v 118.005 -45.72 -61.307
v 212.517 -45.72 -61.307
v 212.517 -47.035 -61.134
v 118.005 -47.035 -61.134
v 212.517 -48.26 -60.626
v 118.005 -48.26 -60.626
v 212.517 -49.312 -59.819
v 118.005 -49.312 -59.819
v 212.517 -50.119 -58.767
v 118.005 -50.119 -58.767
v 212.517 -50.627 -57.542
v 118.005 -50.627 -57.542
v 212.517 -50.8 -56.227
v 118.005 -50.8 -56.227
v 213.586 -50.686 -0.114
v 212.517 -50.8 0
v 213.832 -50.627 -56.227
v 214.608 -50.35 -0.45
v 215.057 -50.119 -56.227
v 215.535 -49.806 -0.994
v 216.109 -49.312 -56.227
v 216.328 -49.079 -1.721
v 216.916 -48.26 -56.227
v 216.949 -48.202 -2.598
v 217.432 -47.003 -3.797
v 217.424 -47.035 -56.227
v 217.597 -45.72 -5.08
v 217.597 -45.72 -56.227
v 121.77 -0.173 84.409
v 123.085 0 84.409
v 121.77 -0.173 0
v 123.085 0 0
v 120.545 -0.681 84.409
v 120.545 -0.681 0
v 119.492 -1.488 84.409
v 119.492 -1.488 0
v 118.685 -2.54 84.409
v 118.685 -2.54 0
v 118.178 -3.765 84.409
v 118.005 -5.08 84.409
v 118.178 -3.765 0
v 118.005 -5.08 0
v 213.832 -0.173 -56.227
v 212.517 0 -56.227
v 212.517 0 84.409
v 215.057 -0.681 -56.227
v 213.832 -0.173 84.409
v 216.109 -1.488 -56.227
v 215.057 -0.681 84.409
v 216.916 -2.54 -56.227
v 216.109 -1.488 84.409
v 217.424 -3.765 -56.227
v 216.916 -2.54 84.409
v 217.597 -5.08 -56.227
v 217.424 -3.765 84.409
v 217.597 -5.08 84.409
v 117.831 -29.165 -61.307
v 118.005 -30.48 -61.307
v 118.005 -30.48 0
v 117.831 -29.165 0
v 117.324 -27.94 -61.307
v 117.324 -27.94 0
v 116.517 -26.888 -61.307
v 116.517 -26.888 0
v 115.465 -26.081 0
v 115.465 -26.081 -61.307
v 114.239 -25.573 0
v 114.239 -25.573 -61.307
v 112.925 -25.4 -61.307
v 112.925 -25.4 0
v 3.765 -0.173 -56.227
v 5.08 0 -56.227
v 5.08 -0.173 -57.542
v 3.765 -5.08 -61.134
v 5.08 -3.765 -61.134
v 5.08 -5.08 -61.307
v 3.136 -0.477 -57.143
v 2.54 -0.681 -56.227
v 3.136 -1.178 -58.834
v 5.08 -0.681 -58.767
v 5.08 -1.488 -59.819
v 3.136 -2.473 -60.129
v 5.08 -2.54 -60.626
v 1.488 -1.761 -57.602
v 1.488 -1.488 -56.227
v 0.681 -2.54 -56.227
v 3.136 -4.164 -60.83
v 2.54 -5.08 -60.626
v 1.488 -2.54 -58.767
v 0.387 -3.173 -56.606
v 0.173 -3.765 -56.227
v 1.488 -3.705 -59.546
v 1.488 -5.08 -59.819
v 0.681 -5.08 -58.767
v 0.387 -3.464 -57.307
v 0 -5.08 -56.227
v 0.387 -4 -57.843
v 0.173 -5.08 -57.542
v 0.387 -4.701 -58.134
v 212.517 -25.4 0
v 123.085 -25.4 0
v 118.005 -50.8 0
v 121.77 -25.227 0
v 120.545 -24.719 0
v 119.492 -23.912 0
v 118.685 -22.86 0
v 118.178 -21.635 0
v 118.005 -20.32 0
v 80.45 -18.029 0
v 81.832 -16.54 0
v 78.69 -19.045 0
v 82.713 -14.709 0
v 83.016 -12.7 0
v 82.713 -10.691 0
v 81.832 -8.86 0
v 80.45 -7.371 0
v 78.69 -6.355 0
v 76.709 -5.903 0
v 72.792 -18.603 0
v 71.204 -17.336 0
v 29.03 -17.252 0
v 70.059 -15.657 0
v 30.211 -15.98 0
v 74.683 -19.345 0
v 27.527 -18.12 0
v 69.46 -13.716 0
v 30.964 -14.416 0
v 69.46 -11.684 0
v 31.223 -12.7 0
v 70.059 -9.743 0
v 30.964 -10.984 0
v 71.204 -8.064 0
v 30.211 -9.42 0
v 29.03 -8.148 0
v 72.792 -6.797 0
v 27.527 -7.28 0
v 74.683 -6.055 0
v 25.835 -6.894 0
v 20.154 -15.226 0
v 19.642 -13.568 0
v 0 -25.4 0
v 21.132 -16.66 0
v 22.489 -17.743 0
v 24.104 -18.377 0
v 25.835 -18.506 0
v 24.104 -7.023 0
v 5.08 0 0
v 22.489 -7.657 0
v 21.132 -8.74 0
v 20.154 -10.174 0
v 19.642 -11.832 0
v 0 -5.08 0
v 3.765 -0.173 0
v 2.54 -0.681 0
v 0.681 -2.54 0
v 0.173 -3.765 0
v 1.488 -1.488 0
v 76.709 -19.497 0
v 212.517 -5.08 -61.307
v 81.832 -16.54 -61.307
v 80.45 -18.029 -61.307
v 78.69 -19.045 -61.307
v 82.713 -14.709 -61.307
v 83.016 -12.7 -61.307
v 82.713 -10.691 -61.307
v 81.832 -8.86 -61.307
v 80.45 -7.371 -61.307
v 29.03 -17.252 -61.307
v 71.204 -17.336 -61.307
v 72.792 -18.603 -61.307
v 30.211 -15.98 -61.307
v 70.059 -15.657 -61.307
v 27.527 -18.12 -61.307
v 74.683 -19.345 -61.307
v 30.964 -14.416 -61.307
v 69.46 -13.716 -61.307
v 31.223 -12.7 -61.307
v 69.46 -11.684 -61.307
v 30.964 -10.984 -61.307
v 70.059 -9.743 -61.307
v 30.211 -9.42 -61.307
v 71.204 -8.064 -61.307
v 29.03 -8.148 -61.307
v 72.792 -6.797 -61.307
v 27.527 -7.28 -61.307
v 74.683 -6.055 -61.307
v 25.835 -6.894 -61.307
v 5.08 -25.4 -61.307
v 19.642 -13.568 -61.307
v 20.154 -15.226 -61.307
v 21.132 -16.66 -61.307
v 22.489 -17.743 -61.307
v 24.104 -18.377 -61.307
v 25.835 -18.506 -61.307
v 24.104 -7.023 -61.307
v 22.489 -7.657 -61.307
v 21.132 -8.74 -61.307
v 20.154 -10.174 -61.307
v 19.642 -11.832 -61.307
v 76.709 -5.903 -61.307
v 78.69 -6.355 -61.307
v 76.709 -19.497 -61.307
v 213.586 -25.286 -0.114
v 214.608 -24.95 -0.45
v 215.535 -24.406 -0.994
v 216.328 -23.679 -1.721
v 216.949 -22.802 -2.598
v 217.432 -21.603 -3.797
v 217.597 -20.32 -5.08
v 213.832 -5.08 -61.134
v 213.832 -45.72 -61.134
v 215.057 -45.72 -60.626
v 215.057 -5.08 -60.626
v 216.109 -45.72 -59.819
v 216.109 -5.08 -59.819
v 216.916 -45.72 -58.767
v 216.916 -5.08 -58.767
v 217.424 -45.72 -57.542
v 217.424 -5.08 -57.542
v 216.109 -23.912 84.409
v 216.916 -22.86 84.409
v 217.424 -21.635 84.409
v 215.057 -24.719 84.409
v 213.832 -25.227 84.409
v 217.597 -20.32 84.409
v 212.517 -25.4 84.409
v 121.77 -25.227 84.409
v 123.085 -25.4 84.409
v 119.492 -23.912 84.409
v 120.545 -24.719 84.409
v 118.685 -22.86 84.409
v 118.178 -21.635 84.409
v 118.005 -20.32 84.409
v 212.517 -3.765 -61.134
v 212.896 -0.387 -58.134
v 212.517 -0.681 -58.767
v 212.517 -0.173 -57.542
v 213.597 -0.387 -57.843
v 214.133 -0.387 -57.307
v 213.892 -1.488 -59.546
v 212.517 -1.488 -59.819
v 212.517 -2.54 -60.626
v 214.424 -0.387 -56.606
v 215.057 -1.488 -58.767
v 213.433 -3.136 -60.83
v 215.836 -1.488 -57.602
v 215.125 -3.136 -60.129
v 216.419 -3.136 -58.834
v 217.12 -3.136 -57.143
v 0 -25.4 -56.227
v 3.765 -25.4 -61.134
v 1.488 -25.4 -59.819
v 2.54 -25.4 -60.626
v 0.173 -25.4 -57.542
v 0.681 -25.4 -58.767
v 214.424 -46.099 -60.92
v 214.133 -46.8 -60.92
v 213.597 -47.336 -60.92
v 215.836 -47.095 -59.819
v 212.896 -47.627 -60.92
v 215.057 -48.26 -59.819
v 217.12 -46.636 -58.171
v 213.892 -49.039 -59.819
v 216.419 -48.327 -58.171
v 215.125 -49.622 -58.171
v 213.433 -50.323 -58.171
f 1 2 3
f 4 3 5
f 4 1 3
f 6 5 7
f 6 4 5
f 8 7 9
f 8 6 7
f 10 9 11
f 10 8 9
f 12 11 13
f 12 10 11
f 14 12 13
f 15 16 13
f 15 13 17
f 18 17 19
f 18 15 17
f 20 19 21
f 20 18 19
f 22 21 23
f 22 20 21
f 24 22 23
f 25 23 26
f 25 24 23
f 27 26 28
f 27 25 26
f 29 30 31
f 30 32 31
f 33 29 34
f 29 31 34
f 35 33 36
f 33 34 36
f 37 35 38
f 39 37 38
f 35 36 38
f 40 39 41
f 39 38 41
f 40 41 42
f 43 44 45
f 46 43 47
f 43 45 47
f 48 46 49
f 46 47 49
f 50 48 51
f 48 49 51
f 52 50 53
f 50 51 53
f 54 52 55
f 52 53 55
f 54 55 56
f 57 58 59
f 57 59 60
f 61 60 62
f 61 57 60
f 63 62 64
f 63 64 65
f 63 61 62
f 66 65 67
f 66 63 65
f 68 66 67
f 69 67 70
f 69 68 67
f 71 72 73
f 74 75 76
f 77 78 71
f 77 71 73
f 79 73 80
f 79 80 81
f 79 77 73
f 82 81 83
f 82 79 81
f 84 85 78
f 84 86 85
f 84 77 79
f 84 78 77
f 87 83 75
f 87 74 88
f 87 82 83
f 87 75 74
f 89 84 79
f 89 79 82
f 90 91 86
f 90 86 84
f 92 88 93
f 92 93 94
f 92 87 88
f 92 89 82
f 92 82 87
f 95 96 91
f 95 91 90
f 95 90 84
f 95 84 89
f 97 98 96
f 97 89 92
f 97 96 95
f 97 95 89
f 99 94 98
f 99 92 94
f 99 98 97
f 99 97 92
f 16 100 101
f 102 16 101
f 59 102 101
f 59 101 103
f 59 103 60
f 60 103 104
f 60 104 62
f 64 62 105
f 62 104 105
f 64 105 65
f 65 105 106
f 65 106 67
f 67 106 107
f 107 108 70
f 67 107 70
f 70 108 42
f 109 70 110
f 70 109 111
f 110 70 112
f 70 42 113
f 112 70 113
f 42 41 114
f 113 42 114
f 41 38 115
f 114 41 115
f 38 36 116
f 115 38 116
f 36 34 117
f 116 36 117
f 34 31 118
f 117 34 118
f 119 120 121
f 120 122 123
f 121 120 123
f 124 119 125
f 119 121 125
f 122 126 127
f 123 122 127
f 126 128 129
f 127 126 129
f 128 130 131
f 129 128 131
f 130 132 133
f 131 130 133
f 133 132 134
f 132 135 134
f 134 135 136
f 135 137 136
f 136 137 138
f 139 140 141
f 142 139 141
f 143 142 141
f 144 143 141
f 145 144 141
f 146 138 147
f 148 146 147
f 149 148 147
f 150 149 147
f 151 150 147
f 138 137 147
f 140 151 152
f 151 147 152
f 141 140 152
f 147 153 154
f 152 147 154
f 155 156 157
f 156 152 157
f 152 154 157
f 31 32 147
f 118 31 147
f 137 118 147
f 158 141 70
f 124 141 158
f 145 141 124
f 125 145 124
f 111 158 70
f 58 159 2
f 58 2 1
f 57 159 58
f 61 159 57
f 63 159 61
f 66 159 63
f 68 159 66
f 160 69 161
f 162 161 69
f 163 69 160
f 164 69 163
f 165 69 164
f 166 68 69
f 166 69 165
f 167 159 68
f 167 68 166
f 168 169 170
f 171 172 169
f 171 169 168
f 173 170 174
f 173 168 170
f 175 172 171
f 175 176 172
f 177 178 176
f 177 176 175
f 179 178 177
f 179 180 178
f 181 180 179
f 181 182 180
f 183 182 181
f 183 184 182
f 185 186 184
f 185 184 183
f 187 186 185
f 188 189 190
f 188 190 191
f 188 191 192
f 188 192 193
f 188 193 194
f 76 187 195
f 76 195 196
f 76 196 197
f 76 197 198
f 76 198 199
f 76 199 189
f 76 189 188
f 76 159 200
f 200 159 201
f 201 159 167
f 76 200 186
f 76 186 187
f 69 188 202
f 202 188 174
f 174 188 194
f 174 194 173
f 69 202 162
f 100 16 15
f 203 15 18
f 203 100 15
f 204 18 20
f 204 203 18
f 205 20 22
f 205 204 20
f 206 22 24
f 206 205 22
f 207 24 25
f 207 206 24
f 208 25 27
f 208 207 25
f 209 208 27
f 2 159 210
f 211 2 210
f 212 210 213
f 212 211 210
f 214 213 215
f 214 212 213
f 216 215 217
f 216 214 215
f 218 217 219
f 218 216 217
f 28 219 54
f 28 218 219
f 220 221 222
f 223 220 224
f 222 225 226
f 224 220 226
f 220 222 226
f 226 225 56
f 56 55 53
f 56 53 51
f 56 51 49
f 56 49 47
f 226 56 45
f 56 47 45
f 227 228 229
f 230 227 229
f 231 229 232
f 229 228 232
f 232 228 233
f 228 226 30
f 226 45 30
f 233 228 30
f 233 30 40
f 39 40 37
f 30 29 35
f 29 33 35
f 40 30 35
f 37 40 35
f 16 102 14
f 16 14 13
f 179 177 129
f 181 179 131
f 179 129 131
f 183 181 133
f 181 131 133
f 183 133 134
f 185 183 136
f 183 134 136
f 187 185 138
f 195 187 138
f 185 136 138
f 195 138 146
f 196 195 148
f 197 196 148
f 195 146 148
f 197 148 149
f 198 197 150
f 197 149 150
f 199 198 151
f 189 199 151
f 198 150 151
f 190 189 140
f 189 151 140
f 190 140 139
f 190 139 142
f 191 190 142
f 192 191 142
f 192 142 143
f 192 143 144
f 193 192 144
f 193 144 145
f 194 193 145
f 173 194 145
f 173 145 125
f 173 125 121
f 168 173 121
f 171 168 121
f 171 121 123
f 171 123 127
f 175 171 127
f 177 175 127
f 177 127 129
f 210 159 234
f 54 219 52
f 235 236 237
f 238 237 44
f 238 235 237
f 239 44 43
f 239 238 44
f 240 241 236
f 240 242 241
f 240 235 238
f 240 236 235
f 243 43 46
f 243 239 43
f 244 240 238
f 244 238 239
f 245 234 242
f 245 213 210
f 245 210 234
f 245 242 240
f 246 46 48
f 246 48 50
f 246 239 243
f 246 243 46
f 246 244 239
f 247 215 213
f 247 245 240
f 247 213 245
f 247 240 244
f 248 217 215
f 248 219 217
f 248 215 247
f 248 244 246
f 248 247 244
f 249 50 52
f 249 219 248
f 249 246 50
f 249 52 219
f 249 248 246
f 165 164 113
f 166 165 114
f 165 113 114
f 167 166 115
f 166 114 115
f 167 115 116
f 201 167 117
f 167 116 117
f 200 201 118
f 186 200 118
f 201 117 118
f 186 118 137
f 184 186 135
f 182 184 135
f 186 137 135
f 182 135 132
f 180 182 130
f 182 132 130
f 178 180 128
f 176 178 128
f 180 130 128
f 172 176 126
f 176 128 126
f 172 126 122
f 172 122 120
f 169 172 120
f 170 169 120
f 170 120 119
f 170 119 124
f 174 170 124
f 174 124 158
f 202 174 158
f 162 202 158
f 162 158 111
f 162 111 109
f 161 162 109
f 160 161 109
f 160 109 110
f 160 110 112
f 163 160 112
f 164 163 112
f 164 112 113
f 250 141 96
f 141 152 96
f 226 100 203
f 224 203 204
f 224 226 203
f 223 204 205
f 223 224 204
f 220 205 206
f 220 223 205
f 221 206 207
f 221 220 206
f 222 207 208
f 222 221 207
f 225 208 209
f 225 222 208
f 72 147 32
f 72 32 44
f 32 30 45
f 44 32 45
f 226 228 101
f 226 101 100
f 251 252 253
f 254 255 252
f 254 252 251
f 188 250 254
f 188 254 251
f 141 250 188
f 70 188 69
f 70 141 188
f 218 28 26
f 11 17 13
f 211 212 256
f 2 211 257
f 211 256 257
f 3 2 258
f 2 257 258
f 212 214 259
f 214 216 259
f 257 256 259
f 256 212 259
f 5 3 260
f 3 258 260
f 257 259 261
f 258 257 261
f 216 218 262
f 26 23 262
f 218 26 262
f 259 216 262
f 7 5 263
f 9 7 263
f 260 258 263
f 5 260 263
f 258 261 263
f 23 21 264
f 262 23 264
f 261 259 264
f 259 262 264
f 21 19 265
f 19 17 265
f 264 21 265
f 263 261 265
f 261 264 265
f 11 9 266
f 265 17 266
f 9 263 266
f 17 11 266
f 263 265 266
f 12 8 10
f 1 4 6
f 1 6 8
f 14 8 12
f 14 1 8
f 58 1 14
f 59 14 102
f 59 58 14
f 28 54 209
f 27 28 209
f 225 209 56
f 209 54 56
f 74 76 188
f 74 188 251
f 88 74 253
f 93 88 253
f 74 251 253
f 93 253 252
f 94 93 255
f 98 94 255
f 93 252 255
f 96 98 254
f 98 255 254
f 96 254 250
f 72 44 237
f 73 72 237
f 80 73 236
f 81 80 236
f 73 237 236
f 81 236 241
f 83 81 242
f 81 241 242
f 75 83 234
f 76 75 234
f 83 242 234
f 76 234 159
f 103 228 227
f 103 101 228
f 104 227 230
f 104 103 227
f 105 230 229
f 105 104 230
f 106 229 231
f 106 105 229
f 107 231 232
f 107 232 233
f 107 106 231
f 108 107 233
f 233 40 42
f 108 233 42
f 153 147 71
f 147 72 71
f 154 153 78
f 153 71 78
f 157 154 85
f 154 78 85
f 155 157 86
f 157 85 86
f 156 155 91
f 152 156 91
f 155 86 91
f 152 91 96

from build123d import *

# Parameters (mm, degrees)
F1_DEPTH    = 25.4
F2_R        = 5.8227150046
F2_R_2      = 6.8159523424
F3_DEPTH    = 152.4
F4_W        = 99.5925068855
F4_H        = 61.3070130348
F5_DEPTH    = 25.4
F6_T1_DEPTH = 61.3070130348
F7_R        = 5.08
F8_R        = 5.08
F9_R        = 5.08
F10_R       = 5.08
F11_R       = 5.08
F12_R       = 5.08
F13_R       = 5.08


# Not quite as in the source:
# - a fillet or chamfer that OpenCascade refuses, or shapes differently, is made with other operations: its cross-section is extruded or revolved along the edge and cut away or added


with BuildPart() as f1:
    # F0 (on Front) → F1 (new body)
    with BuildSketch(Plane.XZ):
        Polygon((118.0045455694, 0), (0, 0), (0, -61.3070130348), (217.5970524549, -61.3070130348), (217.5970524549, 84.4091549516), (118.0045455694, 84.4091549516), align=None)
    extrude(amount=F1_DEPTH)

    # F2 (on face) → F3 (cut)
    with BuildSketch(Plane.XY):
        with Locations((25.4, -12.7)):
            Circle(F2_R)
        with Locations((76.2, -12.7)):
            Circle(F2_R_2)
    extrude(amount=-F3_DEPTH, mode=Mode.SUBTRACT)

    # F4 (on face) → F5 (join)
    with BuildSketch(Plane.XZ.offset(25.4)):
        with Locations((167.8007990122, -30.6535065174)):
            Rectangle(F4_W, F4_H)
    extrude(amount=F5_DEPTH)

    # F6: fillet of radius 5.08 on 1 edges, made by hand

    # F6_s2 → F6_t1 (join)
    with BuildSketch(Plane.XY.offset(-61.3070130348)):
        with BuildLine():
            ThreePointArc((118.0045455694, -30.48), (116.5166480178, -26.8878975516), (112.9245455694, -25.4))
            Line((112.9245455694, -25.4), (118.0045455694, -25.4))
            Line((118.0045455694, -25.4), (118.0045455694, -30.48))
        make_face()
    extrude(amount=F6_T1_DEPTH)

    # F7
    f7_edges = [f1.edges().sort_by_distance(p)[0] for p in [
        (118.004546, -25.4, 42.204577),
    ]]
    fillet(f7_edges, radius=F7_R)

    # F8
    f8_edges = [f1.edges().sort_by_distance(p)[0] for p in [
        (217.597052, -25.4, 42.204577),
    ]]
    fillet(f8_edges, radius=F8_R)

    # F9
    f9_edges = [f1.edges().sort_by_distance(p)[0] for p in [
        (217.597052, -38.1, 0),
        (217.597052, -50.8, -30.653507),
    ]]
    fillet(f9_edges, radius=F9_R)

    # F10
    f10_edges = [f1.edges().sort_by_distance(p)[0] for p in [
        (217.597052, -22.86, -61.307013),
    ]]
    fillet(f10_edges, radius=F10_R)

    # F11
    f11_edges = [f1.edges().sort_by_distance(p)[0] for p in [
        (217.597052, 0, 14.091071),
    ]]
    fillet(f11_edges, radius=F11_R)

    # F12
    f12_edges = [f1.edges().sort_by_distance(p)[0] for p in [
        (118.004546, 0, 42.204577),
    ]]
    fillet(f12_edges, radius=F12_R)

    # F13
    f13_edges = [f1.edges().sort_by_distance(p)[0] for p in [
        (0, 0, -28.113507),
        (0, -1.487898, -59.819115),
        (0, -15.24, -61.307013),
    ]]
    fillet(f13_edges, radius=F13_R)


solid = f1.part
